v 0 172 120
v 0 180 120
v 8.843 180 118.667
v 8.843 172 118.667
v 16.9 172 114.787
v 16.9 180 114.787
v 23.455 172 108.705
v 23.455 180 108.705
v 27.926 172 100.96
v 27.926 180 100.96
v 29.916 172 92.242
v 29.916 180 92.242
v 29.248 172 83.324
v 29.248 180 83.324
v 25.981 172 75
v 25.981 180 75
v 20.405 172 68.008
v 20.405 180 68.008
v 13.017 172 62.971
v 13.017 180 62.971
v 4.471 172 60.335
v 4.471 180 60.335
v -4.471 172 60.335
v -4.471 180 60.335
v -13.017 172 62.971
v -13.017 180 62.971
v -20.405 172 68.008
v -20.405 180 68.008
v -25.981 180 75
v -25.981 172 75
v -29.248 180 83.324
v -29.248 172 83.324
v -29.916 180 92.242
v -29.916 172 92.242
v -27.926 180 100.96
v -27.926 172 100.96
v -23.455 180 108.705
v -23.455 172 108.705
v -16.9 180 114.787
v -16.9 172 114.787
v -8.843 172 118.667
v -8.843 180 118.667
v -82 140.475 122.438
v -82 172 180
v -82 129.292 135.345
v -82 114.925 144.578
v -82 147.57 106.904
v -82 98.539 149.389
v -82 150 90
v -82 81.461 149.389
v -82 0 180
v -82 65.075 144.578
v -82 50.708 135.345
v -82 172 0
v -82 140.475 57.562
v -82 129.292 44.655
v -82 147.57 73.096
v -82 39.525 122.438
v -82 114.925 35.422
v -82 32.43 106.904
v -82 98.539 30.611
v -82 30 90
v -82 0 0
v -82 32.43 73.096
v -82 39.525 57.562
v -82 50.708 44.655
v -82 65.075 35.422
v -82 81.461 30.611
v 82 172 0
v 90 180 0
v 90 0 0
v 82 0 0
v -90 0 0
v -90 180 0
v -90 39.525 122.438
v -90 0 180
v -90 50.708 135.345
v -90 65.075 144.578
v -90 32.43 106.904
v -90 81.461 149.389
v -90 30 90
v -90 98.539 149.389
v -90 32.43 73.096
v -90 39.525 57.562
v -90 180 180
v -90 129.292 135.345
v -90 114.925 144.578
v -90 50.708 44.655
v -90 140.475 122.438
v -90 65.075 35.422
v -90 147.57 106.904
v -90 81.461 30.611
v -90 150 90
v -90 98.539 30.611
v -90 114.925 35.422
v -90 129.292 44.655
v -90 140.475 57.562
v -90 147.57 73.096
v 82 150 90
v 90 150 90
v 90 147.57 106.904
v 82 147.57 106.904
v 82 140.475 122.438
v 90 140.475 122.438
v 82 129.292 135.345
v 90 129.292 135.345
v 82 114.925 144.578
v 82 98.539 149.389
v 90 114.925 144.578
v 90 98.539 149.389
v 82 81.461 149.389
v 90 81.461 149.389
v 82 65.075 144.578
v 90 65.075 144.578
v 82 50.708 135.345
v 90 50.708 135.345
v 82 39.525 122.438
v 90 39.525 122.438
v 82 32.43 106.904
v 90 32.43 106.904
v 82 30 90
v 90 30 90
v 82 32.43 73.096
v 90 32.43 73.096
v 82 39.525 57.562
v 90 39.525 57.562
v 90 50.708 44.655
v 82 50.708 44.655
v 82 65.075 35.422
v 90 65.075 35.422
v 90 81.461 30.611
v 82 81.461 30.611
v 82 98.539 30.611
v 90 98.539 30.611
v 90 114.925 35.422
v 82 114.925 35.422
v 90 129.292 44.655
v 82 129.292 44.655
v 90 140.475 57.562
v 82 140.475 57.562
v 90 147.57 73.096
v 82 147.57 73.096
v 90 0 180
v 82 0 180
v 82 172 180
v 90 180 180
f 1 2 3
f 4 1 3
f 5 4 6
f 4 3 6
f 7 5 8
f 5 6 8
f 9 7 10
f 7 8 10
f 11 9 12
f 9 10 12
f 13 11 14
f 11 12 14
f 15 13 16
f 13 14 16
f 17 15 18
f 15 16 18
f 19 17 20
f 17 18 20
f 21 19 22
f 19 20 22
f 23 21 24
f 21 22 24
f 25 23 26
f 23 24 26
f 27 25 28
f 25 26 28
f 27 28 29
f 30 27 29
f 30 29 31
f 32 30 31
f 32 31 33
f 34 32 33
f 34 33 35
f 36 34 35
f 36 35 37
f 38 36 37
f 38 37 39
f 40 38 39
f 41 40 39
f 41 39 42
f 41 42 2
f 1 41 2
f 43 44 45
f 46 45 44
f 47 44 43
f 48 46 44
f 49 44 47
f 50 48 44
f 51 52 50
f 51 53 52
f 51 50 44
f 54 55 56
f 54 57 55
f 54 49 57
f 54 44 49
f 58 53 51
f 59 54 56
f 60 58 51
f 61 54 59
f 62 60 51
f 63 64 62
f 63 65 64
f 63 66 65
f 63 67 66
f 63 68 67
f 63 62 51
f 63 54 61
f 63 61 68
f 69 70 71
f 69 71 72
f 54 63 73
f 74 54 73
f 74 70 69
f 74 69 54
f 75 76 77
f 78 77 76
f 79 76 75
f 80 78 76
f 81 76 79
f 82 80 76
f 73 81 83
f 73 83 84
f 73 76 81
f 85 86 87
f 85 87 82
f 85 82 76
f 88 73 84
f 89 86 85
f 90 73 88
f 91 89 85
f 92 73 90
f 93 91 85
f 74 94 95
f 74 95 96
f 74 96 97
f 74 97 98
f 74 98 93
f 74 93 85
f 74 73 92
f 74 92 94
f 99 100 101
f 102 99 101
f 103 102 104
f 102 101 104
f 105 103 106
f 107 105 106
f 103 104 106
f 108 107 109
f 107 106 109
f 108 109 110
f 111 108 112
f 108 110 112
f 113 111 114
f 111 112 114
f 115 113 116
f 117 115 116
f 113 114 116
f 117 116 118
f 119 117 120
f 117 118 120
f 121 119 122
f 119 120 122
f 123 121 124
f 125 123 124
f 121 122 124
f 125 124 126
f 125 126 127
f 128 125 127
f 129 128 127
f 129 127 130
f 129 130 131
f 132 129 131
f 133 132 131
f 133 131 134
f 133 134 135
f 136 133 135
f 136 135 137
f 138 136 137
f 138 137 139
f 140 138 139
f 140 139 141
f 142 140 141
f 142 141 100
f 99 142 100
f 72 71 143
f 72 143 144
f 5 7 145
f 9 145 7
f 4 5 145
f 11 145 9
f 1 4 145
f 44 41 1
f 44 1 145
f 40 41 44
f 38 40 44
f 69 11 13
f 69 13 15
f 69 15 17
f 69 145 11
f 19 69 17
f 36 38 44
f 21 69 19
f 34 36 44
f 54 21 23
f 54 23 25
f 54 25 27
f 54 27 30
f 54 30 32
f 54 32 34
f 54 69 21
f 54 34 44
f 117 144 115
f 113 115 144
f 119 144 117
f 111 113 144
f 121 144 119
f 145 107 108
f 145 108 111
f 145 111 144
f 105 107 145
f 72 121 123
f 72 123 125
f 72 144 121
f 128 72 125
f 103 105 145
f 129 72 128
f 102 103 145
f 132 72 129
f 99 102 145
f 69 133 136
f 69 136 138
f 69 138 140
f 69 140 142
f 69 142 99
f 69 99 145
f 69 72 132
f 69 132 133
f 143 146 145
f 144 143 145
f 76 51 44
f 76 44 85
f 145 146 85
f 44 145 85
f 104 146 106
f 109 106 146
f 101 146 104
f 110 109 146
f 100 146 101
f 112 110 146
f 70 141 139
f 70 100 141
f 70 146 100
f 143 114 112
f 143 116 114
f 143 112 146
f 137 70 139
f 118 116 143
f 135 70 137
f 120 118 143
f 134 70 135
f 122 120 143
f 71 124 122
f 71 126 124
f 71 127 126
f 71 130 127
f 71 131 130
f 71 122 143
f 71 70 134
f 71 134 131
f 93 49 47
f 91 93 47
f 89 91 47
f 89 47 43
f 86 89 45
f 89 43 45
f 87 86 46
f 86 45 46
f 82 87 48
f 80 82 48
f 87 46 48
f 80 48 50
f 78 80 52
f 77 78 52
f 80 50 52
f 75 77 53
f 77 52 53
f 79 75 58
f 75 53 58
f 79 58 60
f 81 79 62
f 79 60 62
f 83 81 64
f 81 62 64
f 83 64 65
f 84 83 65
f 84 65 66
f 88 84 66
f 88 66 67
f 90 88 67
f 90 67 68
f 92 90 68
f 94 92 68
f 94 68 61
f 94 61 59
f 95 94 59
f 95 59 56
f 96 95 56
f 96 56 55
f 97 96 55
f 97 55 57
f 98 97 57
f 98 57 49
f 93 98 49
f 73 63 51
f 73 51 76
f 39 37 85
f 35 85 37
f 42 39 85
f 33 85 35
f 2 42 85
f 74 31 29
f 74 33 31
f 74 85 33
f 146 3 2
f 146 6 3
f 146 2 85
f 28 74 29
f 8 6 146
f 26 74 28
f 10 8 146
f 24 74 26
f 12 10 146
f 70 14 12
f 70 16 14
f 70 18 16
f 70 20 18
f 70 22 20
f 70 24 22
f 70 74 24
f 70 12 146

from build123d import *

# Parameters (mm, degrees)
EXTRUDE_1_DEPTH     = 180
SKETCH_2_R          = 30
CUT_EXTRUDE_1_DEPTH = 180
SKETCH_3_R          = 60
CUT_EXTRUDE_2_DEPTH = 217


with BuildPart() as part:
    # 草图1 → 凸台-拉伸1 (new body)
    with BuildSketch(Plane.XY):
        Polygon((-90, 180), (90, 180), (90, 0), (82, 0), (82, 172), (-82, 172), (-82, 0), (-90, 0), align=None)
    extrude(amount=EXTRUDE_1_DEPTH)

    # 草图2 → 切除-拉伸1 (cut)
    with BuildSketch(Plane(origin=(0, 180, 0), x_dir=(1, 0, 0), z_dir=(0, 1, 0))):
        with Locations(Location((0, -90, 0), (0, 0, 270))):
            Circle(SKETCH_2_R)
    extrude(amount=-CUT_EXTRUDE_1_DEPTH, mode=Mode.SUBTRACT)

    # 草图3 → 切除-拉伸2 (cut)
    with BuildSketch(Plane(origin=(90, 0, 0), x_dir=(0, 0, -1), z_dir=(1, 0, 0))):
        with Locations(Location((-90, 90, 0), (0, 0, 90))):
            Circle(SKETCH_3_R)
    extrude(amount=-CUT_EXTRUDE_2_DEPTH, mode=Mode.SUBTRACT)


solid = part.part
